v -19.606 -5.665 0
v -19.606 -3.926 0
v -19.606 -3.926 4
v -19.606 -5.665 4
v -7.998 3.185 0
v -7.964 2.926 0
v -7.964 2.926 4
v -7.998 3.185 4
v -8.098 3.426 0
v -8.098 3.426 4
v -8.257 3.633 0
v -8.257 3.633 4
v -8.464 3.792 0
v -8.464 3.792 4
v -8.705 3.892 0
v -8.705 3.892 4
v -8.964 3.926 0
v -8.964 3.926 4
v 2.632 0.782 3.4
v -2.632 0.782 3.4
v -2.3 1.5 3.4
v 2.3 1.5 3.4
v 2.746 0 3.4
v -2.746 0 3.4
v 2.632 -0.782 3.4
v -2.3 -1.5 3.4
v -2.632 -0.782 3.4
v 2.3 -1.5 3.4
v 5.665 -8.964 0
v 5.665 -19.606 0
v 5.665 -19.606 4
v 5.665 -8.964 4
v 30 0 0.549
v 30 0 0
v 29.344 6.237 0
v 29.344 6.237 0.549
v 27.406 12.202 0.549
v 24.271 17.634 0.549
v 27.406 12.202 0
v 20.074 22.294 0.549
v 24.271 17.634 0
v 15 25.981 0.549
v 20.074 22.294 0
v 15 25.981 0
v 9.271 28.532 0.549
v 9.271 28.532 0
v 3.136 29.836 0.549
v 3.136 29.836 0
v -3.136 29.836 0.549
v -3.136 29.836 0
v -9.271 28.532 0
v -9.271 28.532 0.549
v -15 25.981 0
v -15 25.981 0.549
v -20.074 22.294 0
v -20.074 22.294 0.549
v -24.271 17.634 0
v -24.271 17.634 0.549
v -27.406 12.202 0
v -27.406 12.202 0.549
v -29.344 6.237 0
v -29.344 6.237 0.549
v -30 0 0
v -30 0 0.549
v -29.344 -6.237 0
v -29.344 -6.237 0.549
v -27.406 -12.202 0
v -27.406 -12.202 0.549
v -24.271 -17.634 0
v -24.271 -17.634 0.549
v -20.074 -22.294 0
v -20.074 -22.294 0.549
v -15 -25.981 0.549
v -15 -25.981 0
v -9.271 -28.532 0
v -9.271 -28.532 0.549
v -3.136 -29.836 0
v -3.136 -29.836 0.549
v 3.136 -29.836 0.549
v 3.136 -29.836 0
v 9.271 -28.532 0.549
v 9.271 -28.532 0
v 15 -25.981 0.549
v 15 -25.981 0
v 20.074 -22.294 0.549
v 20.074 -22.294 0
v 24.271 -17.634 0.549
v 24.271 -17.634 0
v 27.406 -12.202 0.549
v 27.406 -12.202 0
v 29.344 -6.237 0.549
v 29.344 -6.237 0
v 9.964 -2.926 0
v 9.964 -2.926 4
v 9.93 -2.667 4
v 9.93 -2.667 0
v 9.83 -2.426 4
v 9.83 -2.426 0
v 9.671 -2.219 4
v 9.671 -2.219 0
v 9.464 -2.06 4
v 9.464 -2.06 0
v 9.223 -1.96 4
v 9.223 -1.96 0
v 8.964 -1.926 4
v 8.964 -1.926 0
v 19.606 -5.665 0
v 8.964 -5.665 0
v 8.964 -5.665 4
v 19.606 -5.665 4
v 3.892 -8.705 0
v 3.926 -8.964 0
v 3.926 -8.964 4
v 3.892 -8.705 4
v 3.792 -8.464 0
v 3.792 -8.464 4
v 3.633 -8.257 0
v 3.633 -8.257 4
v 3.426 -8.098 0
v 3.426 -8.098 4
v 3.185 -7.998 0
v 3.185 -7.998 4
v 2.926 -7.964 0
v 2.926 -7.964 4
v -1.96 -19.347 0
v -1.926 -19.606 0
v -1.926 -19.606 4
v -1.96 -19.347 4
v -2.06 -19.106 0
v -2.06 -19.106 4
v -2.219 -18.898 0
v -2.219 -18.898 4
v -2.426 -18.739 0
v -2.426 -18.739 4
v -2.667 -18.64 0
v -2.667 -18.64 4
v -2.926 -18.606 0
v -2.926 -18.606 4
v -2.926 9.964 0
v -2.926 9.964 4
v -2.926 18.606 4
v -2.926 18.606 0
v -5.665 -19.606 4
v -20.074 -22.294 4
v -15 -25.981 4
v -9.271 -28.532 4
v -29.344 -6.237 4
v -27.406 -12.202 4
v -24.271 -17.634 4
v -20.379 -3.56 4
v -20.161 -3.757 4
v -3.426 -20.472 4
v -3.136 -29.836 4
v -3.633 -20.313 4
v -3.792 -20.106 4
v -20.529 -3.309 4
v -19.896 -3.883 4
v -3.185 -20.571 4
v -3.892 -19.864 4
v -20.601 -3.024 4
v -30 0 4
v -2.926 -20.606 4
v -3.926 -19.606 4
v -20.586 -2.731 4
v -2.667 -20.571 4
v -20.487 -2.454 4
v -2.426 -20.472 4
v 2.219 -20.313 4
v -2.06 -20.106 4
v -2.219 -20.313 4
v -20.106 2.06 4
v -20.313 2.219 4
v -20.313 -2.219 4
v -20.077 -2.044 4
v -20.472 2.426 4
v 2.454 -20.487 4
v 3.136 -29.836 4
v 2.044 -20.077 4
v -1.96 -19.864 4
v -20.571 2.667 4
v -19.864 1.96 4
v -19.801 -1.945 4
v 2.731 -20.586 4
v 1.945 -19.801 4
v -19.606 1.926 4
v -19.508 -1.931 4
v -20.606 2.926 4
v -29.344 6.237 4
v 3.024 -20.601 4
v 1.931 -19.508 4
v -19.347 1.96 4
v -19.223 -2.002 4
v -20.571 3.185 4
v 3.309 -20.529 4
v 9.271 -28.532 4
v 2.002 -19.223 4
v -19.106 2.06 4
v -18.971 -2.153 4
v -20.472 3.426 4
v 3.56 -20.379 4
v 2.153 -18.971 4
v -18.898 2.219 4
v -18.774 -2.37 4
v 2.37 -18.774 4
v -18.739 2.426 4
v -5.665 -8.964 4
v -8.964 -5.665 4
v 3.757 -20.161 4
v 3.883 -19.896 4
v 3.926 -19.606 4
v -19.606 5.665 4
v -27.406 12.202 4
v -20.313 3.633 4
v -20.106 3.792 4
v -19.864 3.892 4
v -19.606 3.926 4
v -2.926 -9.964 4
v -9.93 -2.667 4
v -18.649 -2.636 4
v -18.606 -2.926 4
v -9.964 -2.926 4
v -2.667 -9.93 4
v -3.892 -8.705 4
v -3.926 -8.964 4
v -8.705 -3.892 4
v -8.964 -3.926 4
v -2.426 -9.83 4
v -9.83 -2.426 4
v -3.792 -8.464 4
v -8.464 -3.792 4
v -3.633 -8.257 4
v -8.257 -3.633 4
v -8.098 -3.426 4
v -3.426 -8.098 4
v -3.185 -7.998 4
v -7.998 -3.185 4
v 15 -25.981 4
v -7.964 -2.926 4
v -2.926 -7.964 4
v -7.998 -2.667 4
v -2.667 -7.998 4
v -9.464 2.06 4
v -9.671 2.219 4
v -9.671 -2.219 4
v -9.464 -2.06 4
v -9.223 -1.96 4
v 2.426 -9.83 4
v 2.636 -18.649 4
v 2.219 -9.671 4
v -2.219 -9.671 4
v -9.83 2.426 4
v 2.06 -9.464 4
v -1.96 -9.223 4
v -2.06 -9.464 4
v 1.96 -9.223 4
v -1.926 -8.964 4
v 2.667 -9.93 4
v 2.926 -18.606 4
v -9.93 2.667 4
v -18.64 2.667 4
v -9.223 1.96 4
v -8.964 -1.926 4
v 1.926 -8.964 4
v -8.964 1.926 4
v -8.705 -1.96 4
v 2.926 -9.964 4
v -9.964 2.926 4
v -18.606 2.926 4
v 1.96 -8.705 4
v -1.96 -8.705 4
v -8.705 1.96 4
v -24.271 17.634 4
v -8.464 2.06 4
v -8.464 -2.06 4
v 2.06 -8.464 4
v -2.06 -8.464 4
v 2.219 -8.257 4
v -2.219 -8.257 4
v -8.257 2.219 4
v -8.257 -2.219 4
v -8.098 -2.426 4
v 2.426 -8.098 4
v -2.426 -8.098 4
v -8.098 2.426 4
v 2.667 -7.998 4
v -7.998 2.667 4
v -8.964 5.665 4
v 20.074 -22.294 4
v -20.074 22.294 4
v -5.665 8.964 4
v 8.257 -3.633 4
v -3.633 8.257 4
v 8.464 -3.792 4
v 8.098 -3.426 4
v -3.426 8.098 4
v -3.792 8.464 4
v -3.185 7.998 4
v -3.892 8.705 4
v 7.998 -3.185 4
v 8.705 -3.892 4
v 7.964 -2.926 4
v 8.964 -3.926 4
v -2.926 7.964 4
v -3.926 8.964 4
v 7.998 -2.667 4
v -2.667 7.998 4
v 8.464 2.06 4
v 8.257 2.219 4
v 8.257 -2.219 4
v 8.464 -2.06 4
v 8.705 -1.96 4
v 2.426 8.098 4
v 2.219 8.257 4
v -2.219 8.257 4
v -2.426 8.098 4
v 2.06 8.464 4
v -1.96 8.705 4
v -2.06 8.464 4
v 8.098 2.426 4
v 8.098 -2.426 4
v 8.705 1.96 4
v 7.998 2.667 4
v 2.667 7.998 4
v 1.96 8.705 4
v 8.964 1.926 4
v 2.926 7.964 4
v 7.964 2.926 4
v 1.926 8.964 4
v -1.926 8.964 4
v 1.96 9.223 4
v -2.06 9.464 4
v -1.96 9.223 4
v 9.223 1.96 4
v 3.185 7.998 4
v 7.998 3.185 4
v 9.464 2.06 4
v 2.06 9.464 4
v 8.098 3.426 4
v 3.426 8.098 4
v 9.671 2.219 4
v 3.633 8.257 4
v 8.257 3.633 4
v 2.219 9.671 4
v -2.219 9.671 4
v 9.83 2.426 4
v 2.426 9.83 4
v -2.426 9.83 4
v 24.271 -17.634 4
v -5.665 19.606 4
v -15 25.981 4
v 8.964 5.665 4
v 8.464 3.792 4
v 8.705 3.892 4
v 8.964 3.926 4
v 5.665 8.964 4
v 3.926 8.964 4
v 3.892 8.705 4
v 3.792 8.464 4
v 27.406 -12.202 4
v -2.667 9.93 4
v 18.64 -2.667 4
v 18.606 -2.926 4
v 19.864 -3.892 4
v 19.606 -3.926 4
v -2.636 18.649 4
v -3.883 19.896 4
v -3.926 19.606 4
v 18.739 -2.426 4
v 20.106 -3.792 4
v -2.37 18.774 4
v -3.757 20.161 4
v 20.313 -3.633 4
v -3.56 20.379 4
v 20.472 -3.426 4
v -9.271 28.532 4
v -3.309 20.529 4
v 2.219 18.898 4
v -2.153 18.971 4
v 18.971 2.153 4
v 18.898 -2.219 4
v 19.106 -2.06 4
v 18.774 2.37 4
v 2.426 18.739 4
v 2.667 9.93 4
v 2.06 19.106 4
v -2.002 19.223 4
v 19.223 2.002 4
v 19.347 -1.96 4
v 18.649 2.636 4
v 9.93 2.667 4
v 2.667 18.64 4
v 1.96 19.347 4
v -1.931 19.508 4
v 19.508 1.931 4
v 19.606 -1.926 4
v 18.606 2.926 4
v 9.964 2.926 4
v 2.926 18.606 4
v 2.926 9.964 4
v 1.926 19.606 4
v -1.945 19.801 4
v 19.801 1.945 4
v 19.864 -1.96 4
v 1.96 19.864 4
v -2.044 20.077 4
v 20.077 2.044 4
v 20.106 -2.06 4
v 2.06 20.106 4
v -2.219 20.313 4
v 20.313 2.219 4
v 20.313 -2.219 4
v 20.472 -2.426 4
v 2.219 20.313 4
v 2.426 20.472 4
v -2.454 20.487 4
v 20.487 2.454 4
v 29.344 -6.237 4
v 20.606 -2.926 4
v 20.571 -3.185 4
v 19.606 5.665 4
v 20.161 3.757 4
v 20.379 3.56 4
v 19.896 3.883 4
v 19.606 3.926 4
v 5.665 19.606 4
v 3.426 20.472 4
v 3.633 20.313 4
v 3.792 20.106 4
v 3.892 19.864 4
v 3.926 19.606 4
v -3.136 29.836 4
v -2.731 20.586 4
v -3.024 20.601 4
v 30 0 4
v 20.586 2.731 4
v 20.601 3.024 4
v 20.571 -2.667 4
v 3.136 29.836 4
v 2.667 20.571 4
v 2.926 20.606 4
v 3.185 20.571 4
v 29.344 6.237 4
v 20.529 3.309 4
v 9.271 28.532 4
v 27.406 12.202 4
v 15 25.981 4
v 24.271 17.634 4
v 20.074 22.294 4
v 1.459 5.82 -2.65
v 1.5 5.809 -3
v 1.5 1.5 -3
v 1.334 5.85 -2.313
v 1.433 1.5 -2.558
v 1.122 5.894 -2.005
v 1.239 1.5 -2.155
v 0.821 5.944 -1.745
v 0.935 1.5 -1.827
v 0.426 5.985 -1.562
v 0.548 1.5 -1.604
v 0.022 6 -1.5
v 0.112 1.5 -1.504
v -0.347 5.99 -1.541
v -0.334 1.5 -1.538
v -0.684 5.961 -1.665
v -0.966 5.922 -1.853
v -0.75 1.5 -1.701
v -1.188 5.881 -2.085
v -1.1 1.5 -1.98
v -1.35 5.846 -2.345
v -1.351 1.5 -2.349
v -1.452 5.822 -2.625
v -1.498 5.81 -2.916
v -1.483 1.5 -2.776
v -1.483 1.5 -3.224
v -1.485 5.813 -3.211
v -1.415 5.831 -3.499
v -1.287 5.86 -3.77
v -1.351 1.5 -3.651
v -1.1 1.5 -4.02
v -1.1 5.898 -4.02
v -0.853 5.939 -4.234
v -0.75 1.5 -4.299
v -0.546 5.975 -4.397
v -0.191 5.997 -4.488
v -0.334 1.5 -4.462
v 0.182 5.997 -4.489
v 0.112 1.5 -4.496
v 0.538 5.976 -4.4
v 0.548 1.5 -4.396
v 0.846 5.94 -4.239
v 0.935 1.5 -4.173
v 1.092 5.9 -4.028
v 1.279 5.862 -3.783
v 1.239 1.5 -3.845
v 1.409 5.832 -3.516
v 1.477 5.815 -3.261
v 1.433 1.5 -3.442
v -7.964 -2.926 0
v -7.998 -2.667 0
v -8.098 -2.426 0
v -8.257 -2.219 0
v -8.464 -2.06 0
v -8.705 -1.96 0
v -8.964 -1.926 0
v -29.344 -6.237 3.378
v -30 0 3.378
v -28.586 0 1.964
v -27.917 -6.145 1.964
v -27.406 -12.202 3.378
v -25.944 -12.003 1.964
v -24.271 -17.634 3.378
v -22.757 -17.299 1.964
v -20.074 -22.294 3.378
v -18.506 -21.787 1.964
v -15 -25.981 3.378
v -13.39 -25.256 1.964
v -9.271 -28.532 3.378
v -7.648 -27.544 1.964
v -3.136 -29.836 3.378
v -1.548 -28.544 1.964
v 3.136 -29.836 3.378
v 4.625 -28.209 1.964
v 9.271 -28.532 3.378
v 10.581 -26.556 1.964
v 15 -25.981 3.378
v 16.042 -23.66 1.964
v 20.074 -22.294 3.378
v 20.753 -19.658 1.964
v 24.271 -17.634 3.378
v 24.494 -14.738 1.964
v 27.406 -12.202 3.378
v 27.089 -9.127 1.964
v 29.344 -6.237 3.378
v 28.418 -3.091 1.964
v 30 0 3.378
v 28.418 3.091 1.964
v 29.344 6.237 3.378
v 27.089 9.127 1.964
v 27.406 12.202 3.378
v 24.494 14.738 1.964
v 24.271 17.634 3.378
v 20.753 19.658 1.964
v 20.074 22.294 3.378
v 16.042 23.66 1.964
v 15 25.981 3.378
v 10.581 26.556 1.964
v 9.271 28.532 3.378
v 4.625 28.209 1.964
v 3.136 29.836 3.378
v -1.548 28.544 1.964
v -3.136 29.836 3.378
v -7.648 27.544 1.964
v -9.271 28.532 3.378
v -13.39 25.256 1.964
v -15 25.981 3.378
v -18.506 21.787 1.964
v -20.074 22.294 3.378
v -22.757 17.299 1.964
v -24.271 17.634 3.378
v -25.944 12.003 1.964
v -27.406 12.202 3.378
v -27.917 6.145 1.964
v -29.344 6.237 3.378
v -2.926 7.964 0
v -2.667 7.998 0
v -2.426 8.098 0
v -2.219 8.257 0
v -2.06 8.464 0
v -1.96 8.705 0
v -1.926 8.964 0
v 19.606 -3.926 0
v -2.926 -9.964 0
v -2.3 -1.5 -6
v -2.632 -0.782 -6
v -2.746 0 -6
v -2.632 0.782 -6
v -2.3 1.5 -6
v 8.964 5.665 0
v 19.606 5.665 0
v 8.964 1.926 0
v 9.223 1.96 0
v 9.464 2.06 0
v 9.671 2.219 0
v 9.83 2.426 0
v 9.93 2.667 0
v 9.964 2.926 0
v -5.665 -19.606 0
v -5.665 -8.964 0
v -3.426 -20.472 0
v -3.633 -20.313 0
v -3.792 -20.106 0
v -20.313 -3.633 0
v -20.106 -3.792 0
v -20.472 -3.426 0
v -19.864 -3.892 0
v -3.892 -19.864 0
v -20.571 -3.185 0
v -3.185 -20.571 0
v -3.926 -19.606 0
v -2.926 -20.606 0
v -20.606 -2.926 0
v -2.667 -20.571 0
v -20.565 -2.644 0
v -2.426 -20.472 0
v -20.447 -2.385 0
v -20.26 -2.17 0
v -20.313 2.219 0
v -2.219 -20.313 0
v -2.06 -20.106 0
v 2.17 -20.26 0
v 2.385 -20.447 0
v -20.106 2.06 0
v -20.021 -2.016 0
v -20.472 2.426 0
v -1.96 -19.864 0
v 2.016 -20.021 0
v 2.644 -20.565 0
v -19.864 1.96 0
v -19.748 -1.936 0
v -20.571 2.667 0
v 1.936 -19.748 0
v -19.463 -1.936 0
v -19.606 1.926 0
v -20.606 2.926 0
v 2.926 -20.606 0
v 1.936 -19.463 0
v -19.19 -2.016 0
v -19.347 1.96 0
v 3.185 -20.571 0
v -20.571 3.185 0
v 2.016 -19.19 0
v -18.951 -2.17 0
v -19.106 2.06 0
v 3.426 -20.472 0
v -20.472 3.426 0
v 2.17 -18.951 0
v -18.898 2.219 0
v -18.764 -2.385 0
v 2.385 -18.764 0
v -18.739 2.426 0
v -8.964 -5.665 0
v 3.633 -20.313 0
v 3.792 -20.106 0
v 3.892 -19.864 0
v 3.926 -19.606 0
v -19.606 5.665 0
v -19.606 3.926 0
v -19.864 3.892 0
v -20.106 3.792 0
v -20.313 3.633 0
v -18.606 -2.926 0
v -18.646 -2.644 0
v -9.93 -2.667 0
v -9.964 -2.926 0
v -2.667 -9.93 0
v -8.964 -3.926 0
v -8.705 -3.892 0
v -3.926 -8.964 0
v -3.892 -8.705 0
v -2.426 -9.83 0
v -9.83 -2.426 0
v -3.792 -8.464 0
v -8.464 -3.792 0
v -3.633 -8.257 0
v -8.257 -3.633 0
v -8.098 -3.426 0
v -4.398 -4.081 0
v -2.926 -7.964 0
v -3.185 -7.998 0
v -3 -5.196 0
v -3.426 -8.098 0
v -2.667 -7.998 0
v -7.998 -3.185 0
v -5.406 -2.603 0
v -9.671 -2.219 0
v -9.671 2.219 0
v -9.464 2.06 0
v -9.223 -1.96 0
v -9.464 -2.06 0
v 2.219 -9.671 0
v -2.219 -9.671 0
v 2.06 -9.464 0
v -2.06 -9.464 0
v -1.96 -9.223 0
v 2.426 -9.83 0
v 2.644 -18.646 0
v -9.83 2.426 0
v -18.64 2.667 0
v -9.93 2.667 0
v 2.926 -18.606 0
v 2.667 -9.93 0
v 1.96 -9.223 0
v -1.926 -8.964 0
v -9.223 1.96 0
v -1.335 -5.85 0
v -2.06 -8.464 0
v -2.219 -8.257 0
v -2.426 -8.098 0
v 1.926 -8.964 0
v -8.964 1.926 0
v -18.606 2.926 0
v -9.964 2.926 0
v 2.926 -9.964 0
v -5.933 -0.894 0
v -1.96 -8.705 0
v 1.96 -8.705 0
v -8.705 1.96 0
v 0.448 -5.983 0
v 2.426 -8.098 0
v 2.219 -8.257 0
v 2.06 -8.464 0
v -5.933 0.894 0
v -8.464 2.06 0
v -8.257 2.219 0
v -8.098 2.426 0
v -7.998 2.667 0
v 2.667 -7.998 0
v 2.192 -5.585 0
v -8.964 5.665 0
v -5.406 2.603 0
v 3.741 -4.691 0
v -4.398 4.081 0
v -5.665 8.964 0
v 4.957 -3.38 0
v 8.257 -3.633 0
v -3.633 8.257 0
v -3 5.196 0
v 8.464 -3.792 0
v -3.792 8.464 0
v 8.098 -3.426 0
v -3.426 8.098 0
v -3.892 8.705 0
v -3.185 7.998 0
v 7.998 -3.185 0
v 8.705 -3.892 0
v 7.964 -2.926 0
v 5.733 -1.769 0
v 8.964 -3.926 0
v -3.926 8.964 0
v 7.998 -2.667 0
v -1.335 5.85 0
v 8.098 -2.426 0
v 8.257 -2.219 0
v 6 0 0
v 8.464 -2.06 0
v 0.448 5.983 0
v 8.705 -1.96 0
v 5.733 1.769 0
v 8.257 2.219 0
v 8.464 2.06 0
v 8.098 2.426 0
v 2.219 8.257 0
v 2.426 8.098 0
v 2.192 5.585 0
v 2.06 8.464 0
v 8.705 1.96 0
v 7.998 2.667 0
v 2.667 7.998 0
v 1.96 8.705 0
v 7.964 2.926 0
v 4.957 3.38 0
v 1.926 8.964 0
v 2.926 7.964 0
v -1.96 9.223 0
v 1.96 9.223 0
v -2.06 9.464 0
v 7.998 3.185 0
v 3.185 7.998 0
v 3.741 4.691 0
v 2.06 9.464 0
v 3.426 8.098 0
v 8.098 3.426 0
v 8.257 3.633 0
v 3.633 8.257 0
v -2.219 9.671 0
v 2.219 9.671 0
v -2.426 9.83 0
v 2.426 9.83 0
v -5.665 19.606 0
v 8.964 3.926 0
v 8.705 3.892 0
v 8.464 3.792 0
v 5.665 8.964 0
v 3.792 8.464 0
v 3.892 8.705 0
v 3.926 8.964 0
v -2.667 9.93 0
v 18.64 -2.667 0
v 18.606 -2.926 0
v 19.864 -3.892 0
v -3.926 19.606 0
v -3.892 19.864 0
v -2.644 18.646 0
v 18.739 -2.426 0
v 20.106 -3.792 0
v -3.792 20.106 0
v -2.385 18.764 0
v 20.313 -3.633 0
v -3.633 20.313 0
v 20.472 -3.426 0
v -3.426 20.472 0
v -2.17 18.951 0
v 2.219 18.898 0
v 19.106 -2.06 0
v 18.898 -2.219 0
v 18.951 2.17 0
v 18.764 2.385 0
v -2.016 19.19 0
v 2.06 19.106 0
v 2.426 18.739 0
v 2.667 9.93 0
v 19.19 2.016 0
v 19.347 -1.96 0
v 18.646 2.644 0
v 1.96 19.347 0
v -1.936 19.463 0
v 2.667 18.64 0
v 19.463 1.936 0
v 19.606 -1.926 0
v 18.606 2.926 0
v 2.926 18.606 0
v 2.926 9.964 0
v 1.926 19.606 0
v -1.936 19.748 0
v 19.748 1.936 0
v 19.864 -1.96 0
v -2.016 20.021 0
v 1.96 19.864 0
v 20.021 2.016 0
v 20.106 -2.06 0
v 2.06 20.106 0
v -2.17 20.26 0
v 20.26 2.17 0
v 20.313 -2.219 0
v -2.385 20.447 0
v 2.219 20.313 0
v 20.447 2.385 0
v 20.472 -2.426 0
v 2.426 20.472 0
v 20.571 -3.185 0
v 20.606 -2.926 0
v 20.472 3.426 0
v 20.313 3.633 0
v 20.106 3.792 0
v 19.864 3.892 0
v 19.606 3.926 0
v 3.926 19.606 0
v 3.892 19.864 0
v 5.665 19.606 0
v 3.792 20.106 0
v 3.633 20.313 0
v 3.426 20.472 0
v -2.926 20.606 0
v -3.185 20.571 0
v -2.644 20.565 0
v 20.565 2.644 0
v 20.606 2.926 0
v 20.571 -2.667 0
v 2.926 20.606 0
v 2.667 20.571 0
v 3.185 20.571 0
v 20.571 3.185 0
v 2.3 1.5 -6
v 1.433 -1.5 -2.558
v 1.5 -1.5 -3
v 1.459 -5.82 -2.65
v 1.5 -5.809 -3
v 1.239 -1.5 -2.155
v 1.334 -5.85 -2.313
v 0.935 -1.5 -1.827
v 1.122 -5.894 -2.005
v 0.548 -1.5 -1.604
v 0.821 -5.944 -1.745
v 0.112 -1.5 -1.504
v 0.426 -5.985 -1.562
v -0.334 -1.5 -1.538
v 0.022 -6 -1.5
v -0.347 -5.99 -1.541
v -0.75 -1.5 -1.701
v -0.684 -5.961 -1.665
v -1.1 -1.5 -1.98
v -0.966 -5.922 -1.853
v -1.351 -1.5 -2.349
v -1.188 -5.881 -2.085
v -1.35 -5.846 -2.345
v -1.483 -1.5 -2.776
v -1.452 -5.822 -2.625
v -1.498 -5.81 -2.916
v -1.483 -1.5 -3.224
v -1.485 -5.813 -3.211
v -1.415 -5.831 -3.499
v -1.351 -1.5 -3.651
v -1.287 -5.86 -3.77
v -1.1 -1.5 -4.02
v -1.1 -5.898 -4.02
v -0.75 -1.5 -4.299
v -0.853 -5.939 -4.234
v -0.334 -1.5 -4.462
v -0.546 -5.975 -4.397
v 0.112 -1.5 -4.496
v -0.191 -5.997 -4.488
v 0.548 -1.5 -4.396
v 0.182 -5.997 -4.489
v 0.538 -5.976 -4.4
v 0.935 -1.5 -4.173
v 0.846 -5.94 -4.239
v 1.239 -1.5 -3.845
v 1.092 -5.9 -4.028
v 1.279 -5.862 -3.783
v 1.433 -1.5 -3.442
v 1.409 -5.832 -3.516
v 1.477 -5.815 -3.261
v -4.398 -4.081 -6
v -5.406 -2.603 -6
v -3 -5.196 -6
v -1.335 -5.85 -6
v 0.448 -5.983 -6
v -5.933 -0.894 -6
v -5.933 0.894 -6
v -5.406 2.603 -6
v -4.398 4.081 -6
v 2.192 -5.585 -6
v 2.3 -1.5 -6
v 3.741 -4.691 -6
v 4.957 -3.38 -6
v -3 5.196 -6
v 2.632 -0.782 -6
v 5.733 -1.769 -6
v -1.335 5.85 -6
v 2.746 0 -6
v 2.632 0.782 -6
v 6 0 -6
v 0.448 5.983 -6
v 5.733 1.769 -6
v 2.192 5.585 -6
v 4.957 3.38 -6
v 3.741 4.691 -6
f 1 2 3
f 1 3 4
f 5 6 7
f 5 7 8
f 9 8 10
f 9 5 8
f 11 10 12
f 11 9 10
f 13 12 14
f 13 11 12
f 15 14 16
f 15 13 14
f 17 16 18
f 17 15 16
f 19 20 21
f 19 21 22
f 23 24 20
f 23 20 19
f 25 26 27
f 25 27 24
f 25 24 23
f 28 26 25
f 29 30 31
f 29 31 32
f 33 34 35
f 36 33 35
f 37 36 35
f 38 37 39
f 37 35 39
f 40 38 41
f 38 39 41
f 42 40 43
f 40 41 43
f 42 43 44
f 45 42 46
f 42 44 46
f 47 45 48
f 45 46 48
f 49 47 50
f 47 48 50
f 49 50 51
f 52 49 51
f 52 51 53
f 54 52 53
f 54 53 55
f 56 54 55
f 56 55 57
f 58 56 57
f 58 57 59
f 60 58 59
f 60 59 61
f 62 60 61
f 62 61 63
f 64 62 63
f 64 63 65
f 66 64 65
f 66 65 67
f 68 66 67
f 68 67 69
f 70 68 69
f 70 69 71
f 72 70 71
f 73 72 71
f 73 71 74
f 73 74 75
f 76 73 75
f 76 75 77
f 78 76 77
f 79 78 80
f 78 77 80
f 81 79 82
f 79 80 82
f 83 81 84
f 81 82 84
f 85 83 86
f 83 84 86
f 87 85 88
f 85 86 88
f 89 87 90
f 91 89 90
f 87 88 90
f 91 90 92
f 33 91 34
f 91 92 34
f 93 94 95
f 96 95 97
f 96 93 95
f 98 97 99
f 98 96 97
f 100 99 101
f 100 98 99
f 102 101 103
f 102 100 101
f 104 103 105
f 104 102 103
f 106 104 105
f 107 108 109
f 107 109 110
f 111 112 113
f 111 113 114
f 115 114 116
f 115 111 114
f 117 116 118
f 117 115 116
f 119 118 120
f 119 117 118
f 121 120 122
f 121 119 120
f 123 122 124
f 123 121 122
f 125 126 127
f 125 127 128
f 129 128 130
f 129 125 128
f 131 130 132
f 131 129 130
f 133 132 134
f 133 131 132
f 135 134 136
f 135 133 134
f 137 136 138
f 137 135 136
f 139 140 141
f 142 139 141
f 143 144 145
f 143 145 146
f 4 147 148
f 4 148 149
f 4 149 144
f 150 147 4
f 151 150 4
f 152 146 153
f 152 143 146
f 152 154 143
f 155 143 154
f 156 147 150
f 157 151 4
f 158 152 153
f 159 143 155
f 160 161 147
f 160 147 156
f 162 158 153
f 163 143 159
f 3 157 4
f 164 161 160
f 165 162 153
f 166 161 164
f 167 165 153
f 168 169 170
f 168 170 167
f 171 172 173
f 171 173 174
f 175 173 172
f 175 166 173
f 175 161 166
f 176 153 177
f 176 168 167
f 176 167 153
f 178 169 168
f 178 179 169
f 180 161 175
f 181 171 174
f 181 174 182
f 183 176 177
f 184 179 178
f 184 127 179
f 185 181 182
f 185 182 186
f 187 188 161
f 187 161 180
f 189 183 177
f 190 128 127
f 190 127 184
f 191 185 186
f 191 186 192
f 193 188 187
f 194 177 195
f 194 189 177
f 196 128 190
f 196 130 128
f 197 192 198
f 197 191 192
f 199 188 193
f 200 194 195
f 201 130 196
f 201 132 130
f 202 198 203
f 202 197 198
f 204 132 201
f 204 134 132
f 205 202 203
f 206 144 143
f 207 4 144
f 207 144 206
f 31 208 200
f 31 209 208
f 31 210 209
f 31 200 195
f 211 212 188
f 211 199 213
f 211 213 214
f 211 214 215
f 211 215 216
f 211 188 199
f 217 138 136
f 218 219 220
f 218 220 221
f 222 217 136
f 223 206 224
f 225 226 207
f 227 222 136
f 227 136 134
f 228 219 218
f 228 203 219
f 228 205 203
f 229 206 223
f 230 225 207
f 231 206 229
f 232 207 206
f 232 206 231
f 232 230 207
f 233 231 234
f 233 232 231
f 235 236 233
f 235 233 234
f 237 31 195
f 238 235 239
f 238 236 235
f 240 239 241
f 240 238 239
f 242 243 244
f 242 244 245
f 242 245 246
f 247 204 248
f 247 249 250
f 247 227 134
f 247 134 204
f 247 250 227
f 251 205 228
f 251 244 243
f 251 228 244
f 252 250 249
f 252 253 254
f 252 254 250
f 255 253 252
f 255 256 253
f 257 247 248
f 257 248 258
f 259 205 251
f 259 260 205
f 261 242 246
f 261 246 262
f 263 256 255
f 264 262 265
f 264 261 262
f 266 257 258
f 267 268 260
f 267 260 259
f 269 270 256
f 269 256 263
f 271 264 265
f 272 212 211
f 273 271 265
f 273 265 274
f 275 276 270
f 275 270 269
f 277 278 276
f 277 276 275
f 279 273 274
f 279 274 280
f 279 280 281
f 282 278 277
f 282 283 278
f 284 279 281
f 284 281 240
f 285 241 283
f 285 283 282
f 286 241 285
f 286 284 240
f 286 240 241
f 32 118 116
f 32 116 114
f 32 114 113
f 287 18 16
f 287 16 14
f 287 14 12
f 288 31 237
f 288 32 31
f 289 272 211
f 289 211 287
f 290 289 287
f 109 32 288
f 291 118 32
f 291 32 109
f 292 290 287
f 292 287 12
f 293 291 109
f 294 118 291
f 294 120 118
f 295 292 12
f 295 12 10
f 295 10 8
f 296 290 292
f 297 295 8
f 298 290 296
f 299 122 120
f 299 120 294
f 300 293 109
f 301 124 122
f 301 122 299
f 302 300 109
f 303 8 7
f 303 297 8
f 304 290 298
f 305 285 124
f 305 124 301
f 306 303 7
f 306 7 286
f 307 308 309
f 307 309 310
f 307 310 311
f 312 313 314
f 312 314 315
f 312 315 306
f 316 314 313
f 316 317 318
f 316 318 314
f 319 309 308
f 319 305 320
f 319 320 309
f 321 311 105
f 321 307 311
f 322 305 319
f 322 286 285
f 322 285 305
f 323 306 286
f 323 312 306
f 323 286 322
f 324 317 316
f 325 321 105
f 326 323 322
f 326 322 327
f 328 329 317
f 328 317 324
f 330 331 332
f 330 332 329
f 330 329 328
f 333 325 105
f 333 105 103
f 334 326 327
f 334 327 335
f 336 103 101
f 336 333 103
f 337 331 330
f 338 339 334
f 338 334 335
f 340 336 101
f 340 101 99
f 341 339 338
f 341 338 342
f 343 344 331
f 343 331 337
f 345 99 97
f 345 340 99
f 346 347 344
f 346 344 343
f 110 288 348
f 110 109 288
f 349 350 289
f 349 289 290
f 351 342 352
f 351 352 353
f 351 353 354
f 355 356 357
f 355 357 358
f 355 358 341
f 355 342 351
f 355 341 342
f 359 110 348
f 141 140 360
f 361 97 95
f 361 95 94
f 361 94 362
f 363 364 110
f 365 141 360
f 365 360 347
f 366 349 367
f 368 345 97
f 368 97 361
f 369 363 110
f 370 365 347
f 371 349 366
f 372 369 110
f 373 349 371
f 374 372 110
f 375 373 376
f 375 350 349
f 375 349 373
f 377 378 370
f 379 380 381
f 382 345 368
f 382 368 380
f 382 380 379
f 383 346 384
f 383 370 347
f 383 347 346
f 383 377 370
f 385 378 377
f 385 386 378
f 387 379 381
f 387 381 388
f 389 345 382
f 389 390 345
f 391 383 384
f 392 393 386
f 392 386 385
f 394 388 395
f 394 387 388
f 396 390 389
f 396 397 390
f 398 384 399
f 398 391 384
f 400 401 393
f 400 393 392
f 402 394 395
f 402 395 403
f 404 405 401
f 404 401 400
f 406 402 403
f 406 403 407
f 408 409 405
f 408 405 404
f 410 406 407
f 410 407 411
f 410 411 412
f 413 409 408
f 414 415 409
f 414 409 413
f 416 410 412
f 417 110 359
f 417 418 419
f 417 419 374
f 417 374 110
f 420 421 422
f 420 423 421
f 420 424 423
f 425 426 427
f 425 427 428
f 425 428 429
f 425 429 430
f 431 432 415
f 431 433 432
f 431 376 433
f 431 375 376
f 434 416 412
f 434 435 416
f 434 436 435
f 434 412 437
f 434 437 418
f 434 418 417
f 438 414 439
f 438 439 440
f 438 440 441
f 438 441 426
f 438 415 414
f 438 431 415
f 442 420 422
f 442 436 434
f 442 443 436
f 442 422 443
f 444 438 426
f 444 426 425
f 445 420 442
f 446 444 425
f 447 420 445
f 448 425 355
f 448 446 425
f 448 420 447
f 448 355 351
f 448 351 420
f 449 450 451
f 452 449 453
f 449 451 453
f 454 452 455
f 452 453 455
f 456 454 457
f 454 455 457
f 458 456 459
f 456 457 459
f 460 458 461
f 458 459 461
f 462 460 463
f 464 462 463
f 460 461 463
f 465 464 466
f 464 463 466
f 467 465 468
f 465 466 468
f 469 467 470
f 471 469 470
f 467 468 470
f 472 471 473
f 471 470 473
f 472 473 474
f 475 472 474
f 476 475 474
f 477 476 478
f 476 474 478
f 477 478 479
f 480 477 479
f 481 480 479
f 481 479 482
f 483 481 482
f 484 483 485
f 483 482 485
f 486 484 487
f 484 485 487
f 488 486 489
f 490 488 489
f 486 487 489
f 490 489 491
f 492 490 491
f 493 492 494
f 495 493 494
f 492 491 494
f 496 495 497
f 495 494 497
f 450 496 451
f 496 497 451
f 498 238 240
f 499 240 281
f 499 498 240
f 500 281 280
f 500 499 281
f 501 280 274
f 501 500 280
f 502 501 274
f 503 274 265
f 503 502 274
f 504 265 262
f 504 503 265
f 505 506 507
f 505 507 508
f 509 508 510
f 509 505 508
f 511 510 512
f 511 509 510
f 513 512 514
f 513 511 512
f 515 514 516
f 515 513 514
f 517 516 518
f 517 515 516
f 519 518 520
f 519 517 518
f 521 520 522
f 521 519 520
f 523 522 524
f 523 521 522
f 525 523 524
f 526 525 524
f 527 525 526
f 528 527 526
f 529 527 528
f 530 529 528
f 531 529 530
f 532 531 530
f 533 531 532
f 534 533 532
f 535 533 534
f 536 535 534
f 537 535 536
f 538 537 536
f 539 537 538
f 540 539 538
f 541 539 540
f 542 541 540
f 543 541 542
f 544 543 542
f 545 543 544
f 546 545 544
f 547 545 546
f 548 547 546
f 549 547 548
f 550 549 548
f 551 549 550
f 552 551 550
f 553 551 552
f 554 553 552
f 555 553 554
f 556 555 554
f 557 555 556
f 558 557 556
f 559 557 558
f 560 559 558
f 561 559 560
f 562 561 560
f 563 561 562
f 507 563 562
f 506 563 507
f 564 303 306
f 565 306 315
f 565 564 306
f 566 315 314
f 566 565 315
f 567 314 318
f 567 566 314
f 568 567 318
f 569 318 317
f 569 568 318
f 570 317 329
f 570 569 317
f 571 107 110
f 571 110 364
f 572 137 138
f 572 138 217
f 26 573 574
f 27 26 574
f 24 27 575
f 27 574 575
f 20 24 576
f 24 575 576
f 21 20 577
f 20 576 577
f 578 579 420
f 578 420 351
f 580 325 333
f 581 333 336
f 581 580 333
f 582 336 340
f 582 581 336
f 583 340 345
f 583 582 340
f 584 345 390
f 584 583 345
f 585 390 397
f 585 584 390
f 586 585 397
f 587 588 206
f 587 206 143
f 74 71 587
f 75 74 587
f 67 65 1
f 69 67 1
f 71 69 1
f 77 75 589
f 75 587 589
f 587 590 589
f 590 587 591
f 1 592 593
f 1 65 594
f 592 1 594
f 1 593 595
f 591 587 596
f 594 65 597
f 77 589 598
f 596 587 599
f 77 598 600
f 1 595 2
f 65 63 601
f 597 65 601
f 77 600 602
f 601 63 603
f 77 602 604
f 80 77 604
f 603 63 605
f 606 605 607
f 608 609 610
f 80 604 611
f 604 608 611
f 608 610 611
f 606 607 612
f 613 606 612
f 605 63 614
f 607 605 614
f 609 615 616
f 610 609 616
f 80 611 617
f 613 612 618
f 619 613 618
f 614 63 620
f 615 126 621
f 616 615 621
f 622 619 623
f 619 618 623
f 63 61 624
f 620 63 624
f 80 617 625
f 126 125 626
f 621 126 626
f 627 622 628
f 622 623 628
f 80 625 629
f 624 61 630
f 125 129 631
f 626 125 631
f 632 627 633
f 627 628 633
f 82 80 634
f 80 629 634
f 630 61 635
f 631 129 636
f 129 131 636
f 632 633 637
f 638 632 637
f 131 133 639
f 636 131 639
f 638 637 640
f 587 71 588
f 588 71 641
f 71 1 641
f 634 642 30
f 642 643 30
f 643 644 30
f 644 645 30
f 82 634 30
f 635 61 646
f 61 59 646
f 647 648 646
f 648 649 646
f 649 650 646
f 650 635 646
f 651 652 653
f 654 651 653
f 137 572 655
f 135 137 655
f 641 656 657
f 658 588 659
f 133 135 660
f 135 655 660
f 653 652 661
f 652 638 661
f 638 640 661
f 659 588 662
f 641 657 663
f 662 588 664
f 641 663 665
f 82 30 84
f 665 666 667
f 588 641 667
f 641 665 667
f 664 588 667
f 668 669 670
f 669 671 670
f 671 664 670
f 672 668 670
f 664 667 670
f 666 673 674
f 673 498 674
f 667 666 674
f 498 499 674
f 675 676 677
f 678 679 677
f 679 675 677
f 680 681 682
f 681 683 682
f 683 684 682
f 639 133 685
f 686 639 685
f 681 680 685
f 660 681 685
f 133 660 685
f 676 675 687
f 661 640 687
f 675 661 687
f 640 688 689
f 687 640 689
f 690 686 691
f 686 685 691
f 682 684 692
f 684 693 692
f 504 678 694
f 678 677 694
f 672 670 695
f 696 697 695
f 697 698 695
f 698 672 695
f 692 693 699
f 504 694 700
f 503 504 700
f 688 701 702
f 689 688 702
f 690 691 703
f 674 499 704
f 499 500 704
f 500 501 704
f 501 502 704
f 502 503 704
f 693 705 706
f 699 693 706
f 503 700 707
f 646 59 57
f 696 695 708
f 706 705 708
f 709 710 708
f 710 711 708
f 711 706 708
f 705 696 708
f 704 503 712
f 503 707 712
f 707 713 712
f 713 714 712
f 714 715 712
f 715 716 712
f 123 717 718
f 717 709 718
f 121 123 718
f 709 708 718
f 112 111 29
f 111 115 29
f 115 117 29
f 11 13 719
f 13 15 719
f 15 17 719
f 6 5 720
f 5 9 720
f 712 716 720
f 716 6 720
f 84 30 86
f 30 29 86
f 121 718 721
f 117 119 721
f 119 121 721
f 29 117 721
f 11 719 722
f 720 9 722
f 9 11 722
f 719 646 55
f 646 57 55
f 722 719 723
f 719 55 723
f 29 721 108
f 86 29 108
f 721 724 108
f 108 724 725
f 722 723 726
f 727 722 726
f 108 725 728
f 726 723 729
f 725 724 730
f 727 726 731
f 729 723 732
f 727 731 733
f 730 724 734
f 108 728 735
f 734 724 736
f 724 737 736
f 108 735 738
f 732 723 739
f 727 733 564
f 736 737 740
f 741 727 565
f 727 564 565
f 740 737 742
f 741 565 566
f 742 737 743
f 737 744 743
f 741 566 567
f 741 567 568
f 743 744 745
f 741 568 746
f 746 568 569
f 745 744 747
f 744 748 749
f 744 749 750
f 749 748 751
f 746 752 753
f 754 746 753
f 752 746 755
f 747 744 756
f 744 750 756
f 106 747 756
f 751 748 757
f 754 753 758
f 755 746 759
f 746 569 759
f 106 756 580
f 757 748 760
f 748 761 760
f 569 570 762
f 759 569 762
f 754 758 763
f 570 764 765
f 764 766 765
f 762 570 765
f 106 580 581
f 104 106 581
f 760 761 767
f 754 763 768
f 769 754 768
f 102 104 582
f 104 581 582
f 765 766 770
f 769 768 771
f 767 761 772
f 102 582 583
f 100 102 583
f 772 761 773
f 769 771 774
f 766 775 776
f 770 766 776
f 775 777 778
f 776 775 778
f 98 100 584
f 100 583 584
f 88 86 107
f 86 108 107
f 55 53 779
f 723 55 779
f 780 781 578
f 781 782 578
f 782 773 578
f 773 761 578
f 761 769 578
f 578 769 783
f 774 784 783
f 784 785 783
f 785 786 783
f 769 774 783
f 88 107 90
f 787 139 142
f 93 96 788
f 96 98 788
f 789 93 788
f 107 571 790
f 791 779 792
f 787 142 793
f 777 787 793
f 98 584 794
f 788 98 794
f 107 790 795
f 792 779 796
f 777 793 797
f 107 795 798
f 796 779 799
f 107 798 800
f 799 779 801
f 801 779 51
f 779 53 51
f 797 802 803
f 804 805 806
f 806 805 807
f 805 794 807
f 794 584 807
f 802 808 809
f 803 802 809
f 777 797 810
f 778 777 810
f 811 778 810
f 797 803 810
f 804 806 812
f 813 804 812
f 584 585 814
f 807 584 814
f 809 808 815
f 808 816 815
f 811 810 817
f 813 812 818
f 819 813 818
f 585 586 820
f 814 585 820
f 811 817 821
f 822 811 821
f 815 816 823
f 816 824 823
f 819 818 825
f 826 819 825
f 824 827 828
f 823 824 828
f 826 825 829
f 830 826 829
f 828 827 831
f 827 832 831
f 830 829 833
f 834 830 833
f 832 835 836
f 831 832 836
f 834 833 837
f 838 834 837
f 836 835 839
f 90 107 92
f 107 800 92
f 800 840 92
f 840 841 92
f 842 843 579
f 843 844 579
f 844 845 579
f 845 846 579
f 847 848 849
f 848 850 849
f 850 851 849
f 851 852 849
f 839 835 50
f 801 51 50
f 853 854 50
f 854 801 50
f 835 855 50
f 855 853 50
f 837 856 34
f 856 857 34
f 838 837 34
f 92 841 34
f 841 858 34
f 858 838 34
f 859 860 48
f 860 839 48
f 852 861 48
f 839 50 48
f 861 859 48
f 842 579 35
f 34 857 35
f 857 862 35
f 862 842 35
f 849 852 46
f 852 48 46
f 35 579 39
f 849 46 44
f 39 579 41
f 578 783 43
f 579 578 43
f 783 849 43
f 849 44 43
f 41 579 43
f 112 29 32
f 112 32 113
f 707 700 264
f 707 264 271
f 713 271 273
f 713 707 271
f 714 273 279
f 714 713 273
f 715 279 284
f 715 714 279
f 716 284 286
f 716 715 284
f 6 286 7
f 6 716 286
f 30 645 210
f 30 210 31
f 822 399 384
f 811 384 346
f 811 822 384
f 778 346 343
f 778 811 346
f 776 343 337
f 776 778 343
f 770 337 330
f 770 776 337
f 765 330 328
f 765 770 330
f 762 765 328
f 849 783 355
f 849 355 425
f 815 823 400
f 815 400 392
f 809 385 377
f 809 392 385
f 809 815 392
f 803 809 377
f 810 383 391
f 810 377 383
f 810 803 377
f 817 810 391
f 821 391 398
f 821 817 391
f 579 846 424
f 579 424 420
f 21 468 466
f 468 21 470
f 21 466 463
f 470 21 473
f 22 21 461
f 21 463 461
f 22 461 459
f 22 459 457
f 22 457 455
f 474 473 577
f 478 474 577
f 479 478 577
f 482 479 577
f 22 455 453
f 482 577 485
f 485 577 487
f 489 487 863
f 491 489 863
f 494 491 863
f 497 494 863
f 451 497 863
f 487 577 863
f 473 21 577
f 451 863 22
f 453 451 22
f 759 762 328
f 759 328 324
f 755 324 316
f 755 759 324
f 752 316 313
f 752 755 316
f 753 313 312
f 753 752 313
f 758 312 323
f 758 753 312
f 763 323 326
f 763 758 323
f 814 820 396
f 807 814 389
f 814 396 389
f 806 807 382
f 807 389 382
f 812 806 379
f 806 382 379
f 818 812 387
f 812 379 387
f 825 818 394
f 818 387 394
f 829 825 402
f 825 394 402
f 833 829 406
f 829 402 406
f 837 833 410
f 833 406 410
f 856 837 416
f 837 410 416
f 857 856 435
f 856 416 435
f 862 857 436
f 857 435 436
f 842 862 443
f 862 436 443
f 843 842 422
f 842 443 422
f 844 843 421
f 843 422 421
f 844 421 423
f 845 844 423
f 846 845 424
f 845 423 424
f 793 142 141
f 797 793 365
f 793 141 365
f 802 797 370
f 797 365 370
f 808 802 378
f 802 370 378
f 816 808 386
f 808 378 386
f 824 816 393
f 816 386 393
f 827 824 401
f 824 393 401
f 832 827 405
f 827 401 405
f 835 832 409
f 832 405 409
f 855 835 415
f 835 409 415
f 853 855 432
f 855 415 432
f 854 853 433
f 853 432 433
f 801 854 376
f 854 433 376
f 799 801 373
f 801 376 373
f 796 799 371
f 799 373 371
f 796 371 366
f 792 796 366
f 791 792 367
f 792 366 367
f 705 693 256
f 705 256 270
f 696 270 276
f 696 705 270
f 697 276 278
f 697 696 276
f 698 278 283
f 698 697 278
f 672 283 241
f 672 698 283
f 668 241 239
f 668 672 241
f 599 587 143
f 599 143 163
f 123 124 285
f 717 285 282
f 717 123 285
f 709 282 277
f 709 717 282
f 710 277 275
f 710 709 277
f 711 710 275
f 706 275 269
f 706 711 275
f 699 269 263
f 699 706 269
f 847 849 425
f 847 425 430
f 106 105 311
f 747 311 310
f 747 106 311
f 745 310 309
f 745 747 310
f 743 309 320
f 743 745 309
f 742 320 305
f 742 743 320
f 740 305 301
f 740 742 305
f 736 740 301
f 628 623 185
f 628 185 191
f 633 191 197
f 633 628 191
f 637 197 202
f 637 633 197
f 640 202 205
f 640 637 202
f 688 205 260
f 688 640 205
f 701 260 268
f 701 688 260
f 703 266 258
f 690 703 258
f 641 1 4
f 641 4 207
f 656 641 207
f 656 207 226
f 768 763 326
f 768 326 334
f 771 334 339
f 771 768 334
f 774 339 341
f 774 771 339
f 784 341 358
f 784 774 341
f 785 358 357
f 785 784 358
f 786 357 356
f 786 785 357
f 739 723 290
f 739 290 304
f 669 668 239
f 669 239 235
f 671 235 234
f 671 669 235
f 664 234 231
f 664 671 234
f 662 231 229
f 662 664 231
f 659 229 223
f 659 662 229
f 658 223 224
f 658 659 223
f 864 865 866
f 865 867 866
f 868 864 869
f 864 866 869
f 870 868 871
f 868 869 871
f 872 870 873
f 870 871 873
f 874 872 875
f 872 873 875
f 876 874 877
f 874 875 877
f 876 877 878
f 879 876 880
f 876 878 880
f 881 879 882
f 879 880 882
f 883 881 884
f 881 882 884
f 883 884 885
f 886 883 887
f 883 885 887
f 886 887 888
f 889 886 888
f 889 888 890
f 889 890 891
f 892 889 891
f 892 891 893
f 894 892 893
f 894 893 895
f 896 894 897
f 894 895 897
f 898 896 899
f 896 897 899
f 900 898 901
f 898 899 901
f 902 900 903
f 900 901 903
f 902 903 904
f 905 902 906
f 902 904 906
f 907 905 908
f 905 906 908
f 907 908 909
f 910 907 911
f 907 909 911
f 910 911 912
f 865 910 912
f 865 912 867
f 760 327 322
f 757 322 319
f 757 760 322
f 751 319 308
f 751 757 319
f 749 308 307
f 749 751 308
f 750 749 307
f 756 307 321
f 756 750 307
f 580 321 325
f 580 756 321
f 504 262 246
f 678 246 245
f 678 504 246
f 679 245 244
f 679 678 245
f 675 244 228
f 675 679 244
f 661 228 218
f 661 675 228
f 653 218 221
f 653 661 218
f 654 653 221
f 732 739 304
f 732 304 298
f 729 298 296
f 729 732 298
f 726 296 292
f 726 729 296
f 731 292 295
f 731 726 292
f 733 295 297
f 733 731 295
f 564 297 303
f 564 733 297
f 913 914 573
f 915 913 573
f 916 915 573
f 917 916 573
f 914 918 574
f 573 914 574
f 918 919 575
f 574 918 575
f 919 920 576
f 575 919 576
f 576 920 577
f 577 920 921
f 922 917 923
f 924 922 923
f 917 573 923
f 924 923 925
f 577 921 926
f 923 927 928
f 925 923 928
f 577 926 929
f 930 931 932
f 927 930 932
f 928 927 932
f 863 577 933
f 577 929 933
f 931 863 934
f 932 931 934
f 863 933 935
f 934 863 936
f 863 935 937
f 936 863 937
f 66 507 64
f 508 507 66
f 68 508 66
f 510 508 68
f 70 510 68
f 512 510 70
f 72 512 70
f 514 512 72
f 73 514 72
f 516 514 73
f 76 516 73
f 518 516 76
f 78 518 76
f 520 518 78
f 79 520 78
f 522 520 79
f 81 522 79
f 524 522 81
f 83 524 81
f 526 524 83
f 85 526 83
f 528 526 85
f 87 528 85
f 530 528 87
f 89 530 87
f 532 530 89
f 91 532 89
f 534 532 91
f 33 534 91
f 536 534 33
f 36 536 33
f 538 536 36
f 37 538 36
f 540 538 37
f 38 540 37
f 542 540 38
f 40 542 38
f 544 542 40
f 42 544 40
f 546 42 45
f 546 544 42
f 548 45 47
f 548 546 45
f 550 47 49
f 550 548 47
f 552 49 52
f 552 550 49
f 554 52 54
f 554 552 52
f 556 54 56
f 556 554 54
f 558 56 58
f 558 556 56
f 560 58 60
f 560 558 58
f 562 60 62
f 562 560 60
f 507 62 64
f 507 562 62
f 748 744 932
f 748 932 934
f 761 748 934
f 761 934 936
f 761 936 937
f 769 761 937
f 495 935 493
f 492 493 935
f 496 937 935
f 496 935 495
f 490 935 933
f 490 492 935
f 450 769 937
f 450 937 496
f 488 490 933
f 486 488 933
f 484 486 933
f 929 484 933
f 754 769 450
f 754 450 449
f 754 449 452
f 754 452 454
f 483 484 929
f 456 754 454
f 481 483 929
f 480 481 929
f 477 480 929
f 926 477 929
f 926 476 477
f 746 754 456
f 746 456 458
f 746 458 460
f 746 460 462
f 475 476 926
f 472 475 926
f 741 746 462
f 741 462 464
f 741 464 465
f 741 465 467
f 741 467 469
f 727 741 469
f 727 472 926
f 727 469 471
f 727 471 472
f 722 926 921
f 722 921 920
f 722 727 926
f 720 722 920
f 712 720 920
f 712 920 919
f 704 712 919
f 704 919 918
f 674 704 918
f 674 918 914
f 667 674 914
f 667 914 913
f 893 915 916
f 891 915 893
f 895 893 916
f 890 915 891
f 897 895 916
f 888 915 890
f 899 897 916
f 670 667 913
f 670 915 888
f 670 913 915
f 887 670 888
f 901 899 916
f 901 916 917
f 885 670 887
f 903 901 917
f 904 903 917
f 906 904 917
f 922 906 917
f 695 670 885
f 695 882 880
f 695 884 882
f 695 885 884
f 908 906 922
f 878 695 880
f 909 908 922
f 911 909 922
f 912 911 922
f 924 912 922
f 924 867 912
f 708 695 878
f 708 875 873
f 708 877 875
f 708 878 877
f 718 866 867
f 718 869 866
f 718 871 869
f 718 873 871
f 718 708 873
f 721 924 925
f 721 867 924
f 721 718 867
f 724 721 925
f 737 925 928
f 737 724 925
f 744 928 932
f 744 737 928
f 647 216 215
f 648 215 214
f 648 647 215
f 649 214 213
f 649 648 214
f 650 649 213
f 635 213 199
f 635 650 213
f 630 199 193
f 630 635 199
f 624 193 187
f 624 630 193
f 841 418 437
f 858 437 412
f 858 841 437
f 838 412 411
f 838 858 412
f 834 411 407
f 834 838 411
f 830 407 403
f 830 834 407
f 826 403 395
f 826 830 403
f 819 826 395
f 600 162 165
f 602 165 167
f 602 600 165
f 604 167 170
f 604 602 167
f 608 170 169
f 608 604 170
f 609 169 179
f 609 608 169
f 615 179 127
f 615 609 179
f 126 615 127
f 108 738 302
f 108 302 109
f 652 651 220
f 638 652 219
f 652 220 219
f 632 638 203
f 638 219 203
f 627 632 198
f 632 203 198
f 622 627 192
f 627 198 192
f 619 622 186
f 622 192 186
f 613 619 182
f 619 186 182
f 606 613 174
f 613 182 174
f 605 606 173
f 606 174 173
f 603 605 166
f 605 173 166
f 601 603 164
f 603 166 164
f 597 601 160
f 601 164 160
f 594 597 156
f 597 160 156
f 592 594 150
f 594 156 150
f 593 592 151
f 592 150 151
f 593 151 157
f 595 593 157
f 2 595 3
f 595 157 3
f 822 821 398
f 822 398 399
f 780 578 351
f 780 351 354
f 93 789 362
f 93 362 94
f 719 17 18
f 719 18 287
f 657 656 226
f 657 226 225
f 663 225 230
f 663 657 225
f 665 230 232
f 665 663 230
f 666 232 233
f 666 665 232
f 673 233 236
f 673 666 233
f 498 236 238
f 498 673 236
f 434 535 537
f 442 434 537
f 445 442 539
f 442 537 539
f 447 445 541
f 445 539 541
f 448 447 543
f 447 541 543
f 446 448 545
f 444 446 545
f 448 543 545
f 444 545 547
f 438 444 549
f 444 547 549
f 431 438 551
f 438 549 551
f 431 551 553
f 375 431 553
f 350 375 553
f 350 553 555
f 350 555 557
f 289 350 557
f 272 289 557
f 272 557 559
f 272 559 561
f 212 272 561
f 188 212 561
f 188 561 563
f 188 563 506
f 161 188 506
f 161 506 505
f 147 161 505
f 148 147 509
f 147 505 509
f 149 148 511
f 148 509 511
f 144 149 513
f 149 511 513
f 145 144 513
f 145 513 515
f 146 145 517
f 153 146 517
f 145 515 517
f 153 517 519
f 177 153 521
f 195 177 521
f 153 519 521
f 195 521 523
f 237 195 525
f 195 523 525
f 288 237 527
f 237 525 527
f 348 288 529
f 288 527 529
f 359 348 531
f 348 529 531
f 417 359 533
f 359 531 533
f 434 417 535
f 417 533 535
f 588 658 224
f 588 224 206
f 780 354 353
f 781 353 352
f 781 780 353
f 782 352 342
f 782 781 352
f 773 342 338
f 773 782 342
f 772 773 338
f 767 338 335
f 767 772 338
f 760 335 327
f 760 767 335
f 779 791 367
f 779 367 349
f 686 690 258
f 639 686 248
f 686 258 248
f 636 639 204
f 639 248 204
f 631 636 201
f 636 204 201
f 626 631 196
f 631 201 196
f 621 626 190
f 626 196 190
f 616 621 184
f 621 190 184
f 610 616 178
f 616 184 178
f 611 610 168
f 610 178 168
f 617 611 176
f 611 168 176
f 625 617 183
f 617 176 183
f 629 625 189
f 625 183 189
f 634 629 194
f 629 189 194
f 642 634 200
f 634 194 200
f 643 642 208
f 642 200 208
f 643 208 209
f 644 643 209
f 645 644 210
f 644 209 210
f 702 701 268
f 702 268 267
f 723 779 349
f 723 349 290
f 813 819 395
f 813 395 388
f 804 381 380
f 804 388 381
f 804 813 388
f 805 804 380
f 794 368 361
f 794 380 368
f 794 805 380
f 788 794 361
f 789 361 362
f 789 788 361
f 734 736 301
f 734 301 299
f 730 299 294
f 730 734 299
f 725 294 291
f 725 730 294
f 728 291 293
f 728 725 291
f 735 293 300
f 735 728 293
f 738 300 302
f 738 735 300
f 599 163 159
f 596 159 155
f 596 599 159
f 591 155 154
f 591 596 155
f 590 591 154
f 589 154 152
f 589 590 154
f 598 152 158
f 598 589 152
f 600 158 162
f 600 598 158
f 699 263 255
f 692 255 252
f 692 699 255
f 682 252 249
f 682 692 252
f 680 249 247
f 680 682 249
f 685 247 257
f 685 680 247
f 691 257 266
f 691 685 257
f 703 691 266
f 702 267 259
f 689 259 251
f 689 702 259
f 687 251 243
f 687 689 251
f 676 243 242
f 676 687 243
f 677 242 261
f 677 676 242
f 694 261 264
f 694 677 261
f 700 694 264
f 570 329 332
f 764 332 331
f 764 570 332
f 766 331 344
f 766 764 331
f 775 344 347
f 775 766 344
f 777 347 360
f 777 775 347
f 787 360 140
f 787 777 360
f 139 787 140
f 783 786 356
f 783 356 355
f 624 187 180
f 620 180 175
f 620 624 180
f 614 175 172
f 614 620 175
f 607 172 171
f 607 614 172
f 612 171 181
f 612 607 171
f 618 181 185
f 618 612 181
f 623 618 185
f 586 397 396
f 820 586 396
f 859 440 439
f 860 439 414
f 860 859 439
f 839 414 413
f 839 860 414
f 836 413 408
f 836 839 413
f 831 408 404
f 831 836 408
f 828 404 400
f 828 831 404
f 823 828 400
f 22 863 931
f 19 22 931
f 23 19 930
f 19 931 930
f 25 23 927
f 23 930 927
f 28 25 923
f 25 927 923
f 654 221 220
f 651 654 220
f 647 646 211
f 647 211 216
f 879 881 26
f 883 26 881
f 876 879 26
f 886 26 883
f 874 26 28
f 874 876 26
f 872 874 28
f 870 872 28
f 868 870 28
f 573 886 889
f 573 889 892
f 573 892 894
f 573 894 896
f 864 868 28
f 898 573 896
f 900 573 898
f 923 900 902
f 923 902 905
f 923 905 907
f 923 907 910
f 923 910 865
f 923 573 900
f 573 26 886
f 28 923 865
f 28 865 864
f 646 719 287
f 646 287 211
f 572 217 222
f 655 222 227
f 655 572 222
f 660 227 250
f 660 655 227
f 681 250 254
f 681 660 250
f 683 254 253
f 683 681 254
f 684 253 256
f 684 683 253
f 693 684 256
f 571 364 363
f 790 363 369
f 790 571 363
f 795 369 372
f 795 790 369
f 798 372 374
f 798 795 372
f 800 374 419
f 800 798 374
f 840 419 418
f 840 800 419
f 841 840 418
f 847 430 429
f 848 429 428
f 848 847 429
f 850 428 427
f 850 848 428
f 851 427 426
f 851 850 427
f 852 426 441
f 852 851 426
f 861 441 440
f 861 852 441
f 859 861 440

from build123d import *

# Parameters (mm, degrees)
F0_R             = 30
F0_R_2           = 6
F1_DEPTH         = 4
F2_DEPTH         = 6
F3_R             = 1.5
F4_DEPTH         = 13
F5_W             = 4.6
F5_H             = 3
F6_DEPTH         = 9.4
F11_DEPTH        = 5
F11_COPIES_COUNT = 4


# Not quite as in the source:
# - a pattern or mirror of a feature is missing from the dataset's text; its kind, count and spacing are read off the source's solid


with BuildPart() as f1:
    # F0 (on Top) → F1 (new body)
    with BuildSketch(Plane.XY):
        Circle(F0_R)
        Circle(F0_R_2, mode=Mode.SUBTRACT)
        Circle(F0_R_2)
    extrude(amount=F1_DEPTH)

    # F0 (on Top) → F2 (join)
    with BuildSketch(Plane.XY):
        Circle(F0_R_2)
    extrude(amount=-F2_DEPTH)

    # F3 (on Front) → F4 (cut, symmetric)
    with BuildSketch(Plane.XZ):
        with Locations((0, -3)):
            Circle(F3_R)
    extrude(amount=F4_DEPTH, both=True, mode=Mode.SUBTRACT)

    # F5 (on face) → F6 (cut)
    with BuildSketch(Plane(origin=(0, 0, -6), x_dir=(1, 0, 0), z_dir=(0, 0, -1))):
        with BuildLine():
            ThreePointArc((2.3, -1.5), (2.7459060435, 0), (2.3, 1.5))
            Line((2.3, 1.5), (2.3, -1.5))
        make_face()
        Rectangle(F5_W, F5_H)
        with BuildLine():
            Line((-2.3, -1.5), (-2.3, 1.5))
            ThreePointArc((-2.3, 1.5), (-2.7459060435, 0), (-2.3, -1.5))
        make_face()
    extrude(amount=-F6_DEPTH, mode=Mode.SUBTRACT)

    # F7 (on Front) → F9 (revolve, cut)
    with BuildSketch(Plane.XZ):
        Polygon((-30, 3.3777931239), (-30, 0.5493659992), (-28.5857864376, 1.9635795616), align=None)
    revolve(axis=Axis((0, 0, -3.6810841411), (0, 0, 1)), mode=Mode.SUBTRACT)

    # F10 (on face) → F11 (cut, symmetric)
    with BuildSketch(Plane.XY):
        with BuildLine():
            Line((5.6645294234, 8.9638868584), (5.6645294234, 19.6055186455))
            Line((5.6645294234, 19.6055186455), (3.9258744954, 19.6055186455))
            ThreePointArc((3.9258744954, 19.6055186455), (3.6329812765, 18.8984118643), (2.9258744954, 18.6055186455))
            Line((2.9258744954, 18.6055186455), (2.9258744954, 9.9638868584))
            ThreePointArc((2.9258744954, 9.9638868584), (3.6329812765, 9.6709936396), (3.9258744954, 8.9638868584))
            Line((3.9258744954, 8.9638868584), (5.6645294234, 8.9638868584))
        make_face()
        with BuildLine():
            Line((-2.9258744954, 9.9638868584), (-2.9258744954, 18.6055186455))
            ThreePointArc((-2.9258744954, 18.6055186455), (-3.6329812765, 18.8984118643), (-3.9258744954, 19.6055186455))
            Line((-3.9258744954, 19.6055186455), (-5.6645294234, 19.6055186455))
            Line((-5.6645294234, 19.6055186455), (-5.6645294234, 8.9638868584))
            Line((-5.6645294234, 8.9638868584), (-3.9258744954, 8.9638868584))
            ThreePointArc((-3.9258744954, 8.9638868584), (-3.6329812765, 9.6709936396), (-2.9258744954, 9.9638868584))
        make_face()
        with BuildLine():
            ThreePointArc((2.9258744954, 18.6055186455), (3.6329812765, 18.8984118643), (3.9258744954, 19.6055186455))
            Line((3.9258744954, 19.6055186455), (2.9258744954, 19.6055186455))
            Line((2.9258744954, 19.6055186455), (2.9258744954, 18.6055186455))
        make_face()
        with BuildLine():
            Line((2.9258744954, 18.6055186455), (2.9258744954, 19.6055186455))
            Line((2.9258744954, 19.6055186455), (1.9258744954, 19.6055186455))
            ThreePointArc((1.9258744954, 19.6055186455), (2.2187677142, 18.8984118643), (2.9258744954, 18.6055186455))
        make_face()
        with BuildLine():
            Line((-2.9258744954, 18.6055186455), (-2.9258744954, 19.6055186455))
            Line((-2.9258744954, 19.6055186455), (-3.9258744954, 19.6055186455))
            ThreePointArc((-3.9258744954, 19.6055186455), (-3.6329812765, 18.8984118643), (-2.9258744954, 18.6055186455))
        make_face()
        with BuildLine():
            Line((2.9258744954, 8.9638868584), (3.9258744954, 8.9638868584))
            ThreePointArc((3.9258744954, 8.9638868584), (3.6329812765, 9.6709936396), (2.9258744954, 9.9638868584))
            Line((2.9258744954, 9.9638868584), (2.9258744954, 8.9638868584))
        make_face()
        with BuildLine():
            ThreePointArc((-2.9258744954, 18.6055186455), (-2.2187677142, 18.8984118643), (-1.9258744954, 19.6055186455))
            Line((-1.9258744954, 19.6055186455), (-2.9258744954, 19.6055186455))
            Line((-2.9258744954, 19.6055186455), (-2.9258744954, 18.6055186455))
        make_face()
        with BuildLine():
            Line((-2.9258744954, 8.9638868584), (-2.9258744954, 9.9638868584))
            ThreePointArc((-2.9258744954, 9.9638868584), (-3.6329812765, 9.6709936396), (-3.9258744954, 8.9638868584))
            Line((-3.9258744954, 8.9638868584), (-2.9258744954, 8.9638868584))
        make_face()
        with BuildLine():
            Line((2.9258744954, 8.9638868584), (2.9258744954, 9.9638868584))
            ThreePointArc((2.9258744954, 9.9638868584), (2.2187677142, 9.6709936396), (1.9258744954, 8.9638868584))
            Line((1.9258744954, 8.9638868584), (2.9258744954, 8.9638868584))
        make_face()
        with BuildLine():
            Line((-2.9258744954, 8.9638868584), (-1.9258744954, 8.9638868584))
            ThreePointArc((-1.9258744954, 8.9638868584), (-2.2187677142, 9.6709936396), (-2.9258744954, 9.9638868584))
            Line((-2.9258744954, 9.9638868584), (-2.9258744954, 8.9638868584))
        make_face()
        with BuildLine():
            Line((2.9258744954, 19.6055186455), (3.9258744954, 19.6055186455))
            ThreePointArc((3.9258744954, 19.6055186455), (3.6329812765, 20.3126254267), (2.9258744954, 20.6055186455))
            Line((2.9258744954, 20.6055186455), (2.9258744954, 19.6055186455))
        make_face()
        with BuildLine():
            Line((1.9258744954, 19.6055186455), (2.9258744954, 19.6055186455))
            Line((2.9258744954, 19.6055186455), (2.9258744954, 20.6055186455))
            ThreePointArc((2.9258744954, 20.6055186455), (2.2187677142, 20.3126254267), (1.9258744954, 19.6055186455))
        make_face()
        with BuildLine():
            Line((-2.9258744954, 19.6055186455), (-1.9258744954, 19.6055186455))
            ThreePointArc((-1.9258744954, 19.6055186455), (-2.2187677142, 20.3126254267), (-2.9258744954, 20.6055186455))
            Line((-2.9258744954, 20.6055186455), (-2.9258744954, 19.6055186455))
        make_face()
        with BuildLine():
            Line((-3.9258744954, 19.6055186455), (-2.9258744954, 19.6055186455))
            Line((-2.9258744954, 19.6055186455), (-2.9258744954, 20.6055186455))
            ThreePointArc((-2.9258744954, 20.6055186455), (-3.6329812765, 20.3126254267), (-3.9258744954, 19.6055186455))
        make_face()
        with BuildLine():
            ThreePointArc((-2.9258744954, 7.9638868584), (-2.2187677142, 8.2567800773), (-1.9258744954, 8.9638868584))
            Line((-1.9258744954, 8.9638868584), (-2.9258744954, 8.9638868584))
            Line((-2.9258744954, 8.9638868584), (-2.9258744954, 7.9638868584))
        make_face()
        with BuildLine():
            Line((2.9258744954, 7.9638868584), (2.9258744954, 8.9638868584))
            Line((2.9258744954, 8.9638868584), (1.9258744954, 8.9638868584))
            ThreePointArc((1.9258744954, 8.9638868584), (2.2187677142, 8.2567800773), (2.9258744954, 7.9638868584))
        make_face()
        with BuildLine():
            ThreePointArc((2.9258744954, 7.9638868584), (3.6329812765, 8.2567800773), (3.9258744954, 8.9638868584))
            Line((3.9258744954, 8.9638868584), (2.9258744954, 8.9638868584))
            Line((2.9258744954, 8.9638868584), (2.9258744954, 7.9638868584))
        make_face()
        with BuildLine():
            Line((-2.9258744954, 7.9638868584), (-2.9258744954, 8.9638868584))
            Line((-2.9258744954, 8.9638868584), (-3.9258744954, 8.9638868584))
            ThreePointArc((-3.9258744954, 8.9638868584), (-3.6329812765, 8.2567800773), (-2.9258744954, 7.9638868584))
        make_face()
    f11 = extrude(amount=F11_DEPTH, both=True, mode=Mode.SUBTRACT)

    # F11_copies: F11 ×4 about axis
    f11_copies_axis = Axis((0, 0, 0), (0, 0, 1))
    for i in range(1, F11_COPIES_COUNT):
        add(f11.rotate(f11_copies_axis, i * 360 / F11_COPIES_COUNT), mode=Mode.SUBTRACT)


solid = f1.part
